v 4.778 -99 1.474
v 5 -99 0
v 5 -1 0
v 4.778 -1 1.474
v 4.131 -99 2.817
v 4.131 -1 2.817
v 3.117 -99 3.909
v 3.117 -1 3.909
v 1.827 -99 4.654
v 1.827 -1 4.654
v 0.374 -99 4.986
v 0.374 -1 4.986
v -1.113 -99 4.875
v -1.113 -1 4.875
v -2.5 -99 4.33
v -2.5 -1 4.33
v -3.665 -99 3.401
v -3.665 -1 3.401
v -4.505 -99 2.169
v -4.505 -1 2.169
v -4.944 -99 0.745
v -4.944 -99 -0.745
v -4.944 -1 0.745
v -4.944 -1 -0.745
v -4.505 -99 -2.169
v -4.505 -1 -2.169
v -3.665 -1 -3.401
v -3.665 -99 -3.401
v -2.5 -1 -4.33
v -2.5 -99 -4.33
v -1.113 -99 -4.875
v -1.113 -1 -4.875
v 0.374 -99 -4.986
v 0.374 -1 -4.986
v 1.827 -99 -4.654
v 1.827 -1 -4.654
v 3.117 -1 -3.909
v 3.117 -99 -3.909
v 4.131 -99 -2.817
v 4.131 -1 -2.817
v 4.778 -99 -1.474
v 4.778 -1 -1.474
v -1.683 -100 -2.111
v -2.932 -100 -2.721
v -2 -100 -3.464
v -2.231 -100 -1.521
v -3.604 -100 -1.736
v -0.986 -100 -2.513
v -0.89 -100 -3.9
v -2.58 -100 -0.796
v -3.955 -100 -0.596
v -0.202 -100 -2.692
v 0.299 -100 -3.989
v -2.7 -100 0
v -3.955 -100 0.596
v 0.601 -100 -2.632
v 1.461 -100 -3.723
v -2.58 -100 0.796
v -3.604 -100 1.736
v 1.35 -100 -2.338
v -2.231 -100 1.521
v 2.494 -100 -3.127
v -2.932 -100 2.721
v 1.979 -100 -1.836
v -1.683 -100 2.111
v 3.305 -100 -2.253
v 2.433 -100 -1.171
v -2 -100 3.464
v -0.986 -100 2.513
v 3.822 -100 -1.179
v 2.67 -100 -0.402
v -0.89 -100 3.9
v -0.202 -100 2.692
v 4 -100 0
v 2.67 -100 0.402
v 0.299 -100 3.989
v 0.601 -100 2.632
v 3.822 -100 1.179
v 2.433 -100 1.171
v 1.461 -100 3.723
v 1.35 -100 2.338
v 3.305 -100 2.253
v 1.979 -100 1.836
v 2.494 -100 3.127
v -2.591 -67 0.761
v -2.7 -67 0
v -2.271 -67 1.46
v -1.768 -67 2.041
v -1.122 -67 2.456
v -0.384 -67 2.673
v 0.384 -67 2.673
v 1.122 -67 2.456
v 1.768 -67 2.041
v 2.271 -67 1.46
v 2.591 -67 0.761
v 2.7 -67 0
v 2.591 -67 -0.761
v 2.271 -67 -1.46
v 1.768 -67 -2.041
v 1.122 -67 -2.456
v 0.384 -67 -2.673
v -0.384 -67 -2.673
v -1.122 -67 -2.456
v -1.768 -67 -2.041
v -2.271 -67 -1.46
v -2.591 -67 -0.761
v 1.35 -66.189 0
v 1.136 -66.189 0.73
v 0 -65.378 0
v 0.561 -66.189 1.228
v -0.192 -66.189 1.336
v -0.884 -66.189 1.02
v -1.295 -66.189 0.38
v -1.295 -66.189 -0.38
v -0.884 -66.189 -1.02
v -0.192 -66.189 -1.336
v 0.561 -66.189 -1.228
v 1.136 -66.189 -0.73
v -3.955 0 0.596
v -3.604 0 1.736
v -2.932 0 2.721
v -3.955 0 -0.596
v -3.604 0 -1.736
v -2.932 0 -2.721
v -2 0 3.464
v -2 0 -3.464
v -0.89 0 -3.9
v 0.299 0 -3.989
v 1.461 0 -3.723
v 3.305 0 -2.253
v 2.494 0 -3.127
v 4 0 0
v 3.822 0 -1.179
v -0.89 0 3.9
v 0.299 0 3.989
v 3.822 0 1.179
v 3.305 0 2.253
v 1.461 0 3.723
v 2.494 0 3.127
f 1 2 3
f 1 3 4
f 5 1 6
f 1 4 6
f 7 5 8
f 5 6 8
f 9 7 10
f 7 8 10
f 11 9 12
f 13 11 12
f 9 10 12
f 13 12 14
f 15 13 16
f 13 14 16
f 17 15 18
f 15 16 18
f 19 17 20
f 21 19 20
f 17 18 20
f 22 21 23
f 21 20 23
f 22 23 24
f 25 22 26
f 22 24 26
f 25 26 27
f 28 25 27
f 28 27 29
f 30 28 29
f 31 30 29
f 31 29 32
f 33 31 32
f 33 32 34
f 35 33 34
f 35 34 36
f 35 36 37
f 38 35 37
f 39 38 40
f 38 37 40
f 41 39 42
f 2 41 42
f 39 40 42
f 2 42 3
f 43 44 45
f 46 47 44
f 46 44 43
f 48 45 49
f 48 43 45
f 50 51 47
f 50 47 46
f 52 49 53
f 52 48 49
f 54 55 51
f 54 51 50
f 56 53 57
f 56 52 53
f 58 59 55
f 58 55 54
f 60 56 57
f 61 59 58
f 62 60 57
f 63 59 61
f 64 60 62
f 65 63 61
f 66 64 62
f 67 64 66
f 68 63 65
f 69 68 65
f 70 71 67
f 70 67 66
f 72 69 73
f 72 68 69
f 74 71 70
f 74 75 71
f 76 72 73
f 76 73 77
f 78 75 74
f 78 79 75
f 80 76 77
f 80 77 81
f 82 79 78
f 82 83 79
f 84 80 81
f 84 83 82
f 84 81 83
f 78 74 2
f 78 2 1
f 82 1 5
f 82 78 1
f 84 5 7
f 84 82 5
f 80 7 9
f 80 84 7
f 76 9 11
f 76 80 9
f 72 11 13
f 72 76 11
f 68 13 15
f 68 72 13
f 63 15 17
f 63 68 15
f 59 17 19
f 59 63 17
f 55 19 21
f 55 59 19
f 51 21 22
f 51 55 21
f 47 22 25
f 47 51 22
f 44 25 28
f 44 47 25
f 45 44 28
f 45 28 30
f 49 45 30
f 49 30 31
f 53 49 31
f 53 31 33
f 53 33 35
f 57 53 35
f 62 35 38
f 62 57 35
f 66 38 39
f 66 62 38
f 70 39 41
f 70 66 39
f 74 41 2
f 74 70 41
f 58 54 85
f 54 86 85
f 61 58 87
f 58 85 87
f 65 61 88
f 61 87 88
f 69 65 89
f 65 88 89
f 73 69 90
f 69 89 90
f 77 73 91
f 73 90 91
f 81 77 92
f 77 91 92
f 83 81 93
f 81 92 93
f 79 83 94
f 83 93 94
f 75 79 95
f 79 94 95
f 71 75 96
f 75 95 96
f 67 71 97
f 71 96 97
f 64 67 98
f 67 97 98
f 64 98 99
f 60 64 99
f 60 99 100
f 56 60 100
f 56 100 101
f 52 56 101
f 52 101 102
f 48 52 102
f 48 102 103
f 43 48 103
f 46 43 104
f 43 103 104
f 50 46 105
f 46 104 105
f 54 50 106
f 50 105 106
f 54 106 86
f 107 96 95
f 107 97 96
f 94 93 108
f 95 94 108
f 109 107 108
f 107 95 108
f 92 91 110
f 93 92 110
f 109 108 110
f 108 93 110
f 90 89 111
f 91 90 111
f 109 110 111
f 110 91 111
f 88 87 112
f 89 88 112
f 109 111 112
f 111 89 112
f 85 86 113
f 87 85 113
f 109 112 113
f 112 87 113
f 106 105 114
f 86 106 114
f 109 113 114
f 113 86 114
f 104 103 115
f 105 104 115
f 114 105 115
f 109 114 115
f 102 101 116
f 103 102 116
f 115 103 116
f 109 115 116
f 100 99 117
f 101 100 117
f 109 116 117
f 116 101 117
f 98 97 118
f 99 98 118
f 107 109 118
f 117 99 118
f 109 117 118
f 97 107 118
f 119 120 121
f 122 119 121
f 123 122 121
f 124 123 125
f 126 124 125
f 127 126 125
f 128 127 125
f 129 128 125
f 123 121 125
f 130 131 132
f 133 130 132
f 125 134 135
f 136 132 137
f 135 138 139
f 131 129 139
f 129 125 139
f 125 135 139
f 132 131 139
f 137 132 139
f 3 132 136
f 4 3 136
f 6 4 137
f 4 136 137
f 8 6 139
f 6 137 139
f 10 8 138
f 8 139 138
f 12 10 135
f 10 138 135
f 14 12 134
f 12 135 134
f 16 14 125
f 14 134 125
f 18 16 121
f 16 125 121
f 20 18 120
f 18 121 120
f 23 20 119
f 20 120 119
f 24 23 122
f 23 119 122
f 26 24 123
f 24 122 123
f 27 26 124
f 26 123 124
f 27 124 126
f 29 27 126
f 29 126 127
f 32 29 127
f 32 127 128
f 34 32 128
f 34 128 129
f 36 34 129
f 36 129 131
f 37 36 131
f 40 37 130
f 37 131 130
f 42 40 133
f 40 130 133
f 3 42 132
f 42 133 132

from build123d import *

# Parameters (mm, degrees)
F0_R     = 5
F1_DEPTH = 100
F2_SIZE  = 1
F4_D     = 5.4
F4_DEPTH = 33
F4_TIP   = 1.6223236714


with BuildPart() as f1:
    # F0 (on Front) → F1 (new body)
    with BuildSketch(Plane.XZ):
        Circle(F0_R)
    extrude(amount=F1_DEPTH)

    # F2
    f2_edges = [f1.edges().sort_by_distance(p)[0] for p in [
        (-5, -100, 0),
        (-5, 0, 0),
    ]]
    chamfer(f2_edges, length=F2_SIZE)

    # F4
    with Locations(Plane.XZ.offset(100)):
        with Locations((0, 0)):
            Hole(F4_D / 2, depth=F4_DEPTH)
            with Locations((0, 0, -(F4_DEPTH + F4_TIP / 2))):  # 118° drill point
                Cone(0, F4_D / 2, F4_TIP, mode=Mode.SUBTRACT)


solid = f1.part
